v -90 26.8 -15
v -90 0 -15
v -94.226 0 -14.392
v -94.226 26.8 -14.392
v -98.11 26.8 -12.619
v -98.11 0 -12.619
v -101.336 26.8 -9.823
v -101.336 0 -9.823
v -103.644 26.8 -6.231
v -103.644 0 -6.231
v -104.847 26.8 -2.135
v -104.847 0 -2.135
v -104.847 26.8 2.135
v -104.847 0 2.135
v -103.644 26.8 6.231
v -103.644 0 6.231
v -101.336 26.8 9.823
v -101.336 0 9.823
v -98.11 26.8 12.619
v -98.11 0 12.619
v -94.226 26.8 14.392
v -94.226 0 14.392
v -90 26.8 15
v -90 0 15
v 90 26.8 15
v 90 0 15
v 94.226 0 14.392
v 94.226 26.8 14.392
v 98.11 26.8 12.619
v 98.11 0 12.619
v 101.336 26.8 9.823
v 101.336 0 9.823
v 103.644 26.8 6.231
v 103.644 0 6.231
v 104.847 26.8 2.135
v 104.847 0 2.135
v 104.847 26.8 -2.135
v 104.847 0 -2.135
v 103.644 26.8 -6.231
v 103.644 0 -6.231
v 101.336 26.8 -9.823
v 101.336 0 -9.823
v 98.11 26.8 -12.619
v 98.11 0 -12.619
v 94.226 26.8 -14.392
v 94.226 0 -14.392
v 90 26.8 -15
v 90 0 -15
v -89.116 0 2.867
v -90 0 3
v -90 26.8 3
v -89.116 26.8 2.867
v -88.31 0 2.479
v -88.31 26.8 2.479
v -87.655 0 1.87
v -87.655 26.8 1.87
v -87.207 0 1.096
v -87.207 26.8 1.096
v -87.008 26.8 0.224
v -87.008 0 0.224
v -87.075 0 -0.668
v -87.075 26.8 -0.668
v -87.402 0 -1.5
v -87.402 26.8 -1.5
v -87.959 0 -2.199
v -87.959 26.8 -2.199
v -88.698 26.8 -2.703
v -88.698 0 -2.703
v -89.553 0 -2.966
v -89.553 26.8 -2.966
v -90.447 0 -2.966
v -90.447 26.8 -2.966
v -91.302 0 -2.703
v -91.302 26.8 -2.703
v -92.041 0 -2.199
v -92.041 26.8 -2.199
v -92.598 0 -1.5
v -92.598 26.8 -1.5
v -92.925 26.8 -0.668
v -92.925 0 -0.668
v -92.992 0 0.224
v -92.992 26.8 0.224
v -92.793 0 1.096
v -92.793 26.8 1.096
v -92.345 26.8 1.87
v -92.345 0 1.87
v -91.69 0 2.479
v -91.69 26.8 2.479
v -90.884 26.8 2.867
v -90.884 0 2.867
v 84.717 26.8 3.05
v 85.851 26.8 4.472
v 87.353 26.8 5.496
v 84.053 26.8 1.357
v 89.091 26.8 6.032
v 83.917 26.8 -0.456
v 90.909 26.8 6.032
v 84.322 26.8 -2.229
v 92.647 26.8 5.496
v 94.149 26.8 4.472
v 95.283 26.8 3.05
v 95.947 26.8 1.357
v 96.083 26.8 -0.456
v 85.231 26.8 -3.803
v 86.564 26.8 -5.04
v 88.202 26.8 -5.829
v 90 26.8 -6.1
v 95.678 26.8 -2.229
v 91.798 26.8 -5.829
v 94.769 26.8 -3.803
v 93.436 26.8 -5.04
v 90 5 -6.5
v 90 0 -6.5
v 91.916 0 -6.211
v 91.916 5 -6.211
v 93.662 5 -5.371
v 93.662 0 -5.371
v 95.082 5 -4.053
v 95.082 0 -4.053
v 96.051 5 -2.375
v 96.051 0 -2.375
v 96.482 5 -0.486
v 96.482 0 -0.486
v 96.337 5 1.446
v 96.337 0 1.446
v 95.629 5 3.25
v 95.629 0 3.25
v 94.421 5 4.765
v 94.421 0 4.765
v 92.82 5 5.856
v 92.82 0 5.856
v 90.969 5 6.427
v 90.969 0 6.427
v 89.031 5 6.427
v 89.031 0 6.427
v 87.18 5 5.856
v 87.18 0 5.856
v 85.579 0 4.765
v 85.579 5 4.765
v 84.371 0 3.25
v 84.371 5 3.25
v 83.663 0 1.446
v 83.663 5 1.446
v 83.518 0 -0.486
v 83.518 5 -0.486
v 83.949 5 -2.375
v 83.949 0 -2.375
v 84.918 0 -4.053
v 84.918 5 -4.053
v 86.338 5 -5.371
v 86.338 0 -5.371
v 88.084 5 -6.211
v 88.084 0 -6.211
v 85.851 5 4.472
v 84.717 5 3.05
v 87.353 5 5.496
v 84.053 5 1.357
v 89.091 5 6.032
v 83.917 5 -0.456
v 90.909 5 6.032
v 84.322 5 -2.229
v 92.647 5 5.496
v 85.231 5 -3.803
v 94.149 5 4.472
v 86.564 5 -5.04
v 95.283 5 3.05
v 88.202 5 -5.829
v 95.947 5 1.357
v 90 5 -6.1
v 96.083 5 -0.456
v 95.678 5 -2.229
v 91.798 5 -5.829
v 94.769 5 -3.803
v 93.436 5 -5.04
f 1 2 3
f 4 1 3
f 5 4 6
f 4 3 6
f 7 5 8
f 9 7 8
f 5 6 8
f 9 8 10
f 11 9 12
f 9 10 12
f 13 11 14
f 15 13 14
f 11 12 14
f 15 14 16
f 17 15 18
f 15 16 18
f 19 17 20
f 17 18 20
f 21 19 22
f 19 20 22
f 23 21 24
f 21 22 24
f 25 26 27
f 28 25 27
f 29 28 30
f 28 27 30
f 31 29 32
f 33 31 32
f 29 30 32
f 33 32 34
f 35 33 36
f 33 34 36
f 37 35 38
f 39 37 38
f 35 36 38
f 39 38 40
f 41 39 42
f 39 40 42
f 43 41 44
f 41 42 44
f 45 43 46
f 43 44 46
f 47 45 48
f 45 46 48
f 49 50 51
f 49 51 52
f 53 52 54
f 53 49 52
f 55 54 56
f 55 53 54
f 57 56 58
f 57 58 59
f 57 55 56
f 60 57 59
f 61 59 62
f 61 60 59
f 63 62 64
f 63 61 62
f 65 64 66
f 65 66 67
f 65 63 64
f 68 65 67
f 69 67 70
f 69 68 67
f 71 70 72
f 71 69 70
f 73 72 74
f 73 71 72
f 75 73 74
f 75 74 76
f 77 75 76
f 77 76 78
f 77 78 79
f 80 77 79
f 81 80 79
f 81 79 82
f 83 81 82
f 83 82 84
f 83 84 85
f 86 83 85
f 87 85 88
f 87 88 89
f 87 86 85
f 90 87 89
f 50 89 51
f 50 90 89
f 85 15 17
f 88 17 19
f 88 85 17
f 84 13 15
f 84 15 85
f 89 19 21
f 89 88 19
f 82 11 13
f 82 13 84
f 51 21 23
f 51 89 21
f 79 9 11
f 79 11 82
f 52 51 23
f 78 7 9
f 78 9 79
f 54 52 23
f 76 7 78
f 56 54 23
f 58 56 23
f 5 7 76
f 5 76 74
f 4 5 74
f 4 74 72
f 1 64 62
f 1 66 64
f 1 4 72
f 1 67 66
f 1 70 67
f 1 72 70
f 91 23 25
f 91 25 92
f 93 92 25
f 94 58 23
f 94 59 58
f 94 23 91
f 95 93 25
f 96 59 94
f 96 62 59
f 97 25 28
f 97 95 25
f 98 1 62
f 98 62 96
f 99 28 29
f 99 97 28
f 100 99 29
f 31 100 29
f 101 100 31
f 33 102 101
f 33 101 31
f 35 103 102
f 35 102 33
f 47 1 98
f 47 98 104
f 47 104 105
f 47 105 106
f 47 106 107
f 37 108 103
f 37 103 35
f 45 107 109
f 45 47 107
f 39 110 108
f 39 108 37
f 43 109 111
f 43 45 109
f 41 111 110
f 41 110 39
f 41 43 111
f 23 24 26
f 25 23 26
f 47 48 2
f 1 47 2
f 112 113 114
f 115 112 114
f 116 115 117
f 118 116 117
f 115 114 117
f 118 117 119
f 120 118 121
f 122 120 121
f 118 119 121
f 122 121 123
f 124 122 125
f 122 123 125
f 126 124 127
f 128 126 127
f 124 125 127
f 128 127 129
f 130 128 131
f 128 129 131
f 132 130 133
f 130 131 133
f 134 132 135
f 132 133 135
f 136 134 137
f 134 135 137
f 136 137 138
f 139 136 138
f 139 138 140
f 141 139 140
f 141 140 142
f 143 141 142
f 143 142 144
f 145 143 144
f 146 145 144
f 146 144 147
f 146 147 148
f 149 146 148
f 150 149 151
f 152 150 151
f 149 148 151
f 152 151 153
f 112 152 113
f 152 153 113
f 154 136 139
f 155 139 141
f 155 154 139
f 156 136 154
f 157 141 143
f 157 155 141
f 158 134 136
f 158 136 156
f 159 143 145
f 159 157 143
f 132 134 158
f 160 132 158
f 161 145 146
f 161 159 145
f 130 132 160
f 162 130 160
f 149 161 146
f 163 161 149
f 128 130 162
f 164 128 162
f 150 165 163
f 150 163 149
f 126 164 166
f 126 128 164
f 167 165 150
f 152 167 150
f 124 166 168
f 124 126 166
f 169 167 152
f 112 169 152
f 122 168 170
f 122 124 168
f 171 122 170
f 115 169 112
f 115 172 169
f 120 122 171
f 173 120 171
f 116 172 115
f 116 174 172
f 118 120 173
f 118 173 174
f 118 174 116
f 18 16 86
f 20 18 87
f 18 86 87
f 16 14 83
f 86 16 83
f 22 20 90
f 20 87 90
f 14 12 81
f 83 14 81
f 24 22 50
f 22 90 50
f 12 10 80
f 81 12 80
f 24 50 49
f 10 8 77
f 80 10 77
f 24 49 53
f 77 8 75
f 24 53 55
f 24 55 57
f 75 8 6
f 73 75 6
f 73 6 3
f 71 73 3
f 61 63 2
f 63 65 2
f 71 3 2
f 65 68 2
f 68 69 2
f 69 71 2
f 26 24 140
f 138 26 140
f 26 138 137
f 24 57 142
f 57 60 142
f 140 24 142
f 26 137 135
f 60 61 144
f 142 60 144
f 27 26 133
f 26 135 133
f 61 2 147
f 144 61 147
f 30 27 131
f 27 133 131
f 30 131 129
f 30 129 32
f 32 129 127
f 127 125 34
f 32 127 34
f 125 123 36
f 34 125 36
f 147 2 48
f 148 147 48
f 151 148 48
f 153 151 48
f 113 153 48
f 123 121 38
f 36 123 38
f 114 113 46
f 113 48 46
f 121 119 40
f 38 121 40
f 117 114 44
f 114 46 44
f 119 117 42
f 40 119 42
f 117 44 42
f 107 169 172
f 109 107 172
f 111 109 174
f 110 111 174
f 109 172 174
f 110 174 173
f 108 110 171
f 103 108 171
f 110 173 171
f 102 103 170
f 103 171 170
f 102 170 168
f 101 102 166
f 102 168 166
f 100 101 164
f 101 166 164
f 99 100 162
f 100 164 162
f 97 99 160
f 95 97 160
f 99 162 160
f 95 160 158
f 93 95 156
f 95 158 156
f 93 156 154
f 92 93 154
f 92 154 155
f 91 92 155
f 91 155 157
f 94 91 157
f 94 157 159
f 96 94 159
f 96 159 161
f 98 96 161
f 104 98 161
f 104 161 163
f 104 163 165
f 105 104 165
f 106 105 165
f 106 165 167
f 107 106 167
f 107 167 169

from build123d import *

# Parameters (mm, degrees)
SKETCH1_R           = 3
BOSS_EXTRUDE2_DEPTH = 26.8
SKETCH2_R           = 6.1
CUT_EXTRUDE1_DEPTH  = 26.8
SKETCH3_R           = 6.5
CUT_EXTRUDE2_DEPTH  = 5


with BuildPart() as part:
    # Sketch1 → Boss-Extrude2 (new body)
    with BuildSketch(Plane(origin=(0, 0, 0), x_dir=(1, 0, 0), z_dir=(0, 1, 0))):
        with BuildLine():
            Line((-90, -15), (90, -15))
            ThreePointArc((90, -15), (105, 0), (90, 15))
            Line((90, 15), (-90, 15))
            ThreePointArc((-90, 15), (-105, 0), (-90, -15))
        make_face()
        with Locations(Location((-90, 0, 0), (0, 0, 270))):
            Circle(SKETCH1_R, mode=Mode.SUBTRACT)
        with Locations(Location((90, 0, 0), (0, 0, 270))):
            Circle(SKETCH1_R, mode=Mode.SUBTRACT)
    extrude(amount=BOSS_EXTRUDE2_DEPTH)

    # Sketch2 → Cut-Extrude1 (cut)
    with BuildSketch(Plane.XZ):
        with Locations(Location((90, 0, 0), (0, 0, 270))):
            Circle(SKETCH2_R)
    extrude(amount=-CUT_EXTRUDE1_DEPTH, mode=Mode.SUBTRACT)

    # Sketch3 → Cut-Extrude2 (cut)
    with BuildSketch(Plane.XZ):
        with Locations(Location((90, 0, 0), (0, 0, 270))):
            Circle(SKETCH3_R)
    extrude(amount=-CUT_EXTRUDE2_DEPTH, mode=Mode.SUBTRACT)


solid = part.part
